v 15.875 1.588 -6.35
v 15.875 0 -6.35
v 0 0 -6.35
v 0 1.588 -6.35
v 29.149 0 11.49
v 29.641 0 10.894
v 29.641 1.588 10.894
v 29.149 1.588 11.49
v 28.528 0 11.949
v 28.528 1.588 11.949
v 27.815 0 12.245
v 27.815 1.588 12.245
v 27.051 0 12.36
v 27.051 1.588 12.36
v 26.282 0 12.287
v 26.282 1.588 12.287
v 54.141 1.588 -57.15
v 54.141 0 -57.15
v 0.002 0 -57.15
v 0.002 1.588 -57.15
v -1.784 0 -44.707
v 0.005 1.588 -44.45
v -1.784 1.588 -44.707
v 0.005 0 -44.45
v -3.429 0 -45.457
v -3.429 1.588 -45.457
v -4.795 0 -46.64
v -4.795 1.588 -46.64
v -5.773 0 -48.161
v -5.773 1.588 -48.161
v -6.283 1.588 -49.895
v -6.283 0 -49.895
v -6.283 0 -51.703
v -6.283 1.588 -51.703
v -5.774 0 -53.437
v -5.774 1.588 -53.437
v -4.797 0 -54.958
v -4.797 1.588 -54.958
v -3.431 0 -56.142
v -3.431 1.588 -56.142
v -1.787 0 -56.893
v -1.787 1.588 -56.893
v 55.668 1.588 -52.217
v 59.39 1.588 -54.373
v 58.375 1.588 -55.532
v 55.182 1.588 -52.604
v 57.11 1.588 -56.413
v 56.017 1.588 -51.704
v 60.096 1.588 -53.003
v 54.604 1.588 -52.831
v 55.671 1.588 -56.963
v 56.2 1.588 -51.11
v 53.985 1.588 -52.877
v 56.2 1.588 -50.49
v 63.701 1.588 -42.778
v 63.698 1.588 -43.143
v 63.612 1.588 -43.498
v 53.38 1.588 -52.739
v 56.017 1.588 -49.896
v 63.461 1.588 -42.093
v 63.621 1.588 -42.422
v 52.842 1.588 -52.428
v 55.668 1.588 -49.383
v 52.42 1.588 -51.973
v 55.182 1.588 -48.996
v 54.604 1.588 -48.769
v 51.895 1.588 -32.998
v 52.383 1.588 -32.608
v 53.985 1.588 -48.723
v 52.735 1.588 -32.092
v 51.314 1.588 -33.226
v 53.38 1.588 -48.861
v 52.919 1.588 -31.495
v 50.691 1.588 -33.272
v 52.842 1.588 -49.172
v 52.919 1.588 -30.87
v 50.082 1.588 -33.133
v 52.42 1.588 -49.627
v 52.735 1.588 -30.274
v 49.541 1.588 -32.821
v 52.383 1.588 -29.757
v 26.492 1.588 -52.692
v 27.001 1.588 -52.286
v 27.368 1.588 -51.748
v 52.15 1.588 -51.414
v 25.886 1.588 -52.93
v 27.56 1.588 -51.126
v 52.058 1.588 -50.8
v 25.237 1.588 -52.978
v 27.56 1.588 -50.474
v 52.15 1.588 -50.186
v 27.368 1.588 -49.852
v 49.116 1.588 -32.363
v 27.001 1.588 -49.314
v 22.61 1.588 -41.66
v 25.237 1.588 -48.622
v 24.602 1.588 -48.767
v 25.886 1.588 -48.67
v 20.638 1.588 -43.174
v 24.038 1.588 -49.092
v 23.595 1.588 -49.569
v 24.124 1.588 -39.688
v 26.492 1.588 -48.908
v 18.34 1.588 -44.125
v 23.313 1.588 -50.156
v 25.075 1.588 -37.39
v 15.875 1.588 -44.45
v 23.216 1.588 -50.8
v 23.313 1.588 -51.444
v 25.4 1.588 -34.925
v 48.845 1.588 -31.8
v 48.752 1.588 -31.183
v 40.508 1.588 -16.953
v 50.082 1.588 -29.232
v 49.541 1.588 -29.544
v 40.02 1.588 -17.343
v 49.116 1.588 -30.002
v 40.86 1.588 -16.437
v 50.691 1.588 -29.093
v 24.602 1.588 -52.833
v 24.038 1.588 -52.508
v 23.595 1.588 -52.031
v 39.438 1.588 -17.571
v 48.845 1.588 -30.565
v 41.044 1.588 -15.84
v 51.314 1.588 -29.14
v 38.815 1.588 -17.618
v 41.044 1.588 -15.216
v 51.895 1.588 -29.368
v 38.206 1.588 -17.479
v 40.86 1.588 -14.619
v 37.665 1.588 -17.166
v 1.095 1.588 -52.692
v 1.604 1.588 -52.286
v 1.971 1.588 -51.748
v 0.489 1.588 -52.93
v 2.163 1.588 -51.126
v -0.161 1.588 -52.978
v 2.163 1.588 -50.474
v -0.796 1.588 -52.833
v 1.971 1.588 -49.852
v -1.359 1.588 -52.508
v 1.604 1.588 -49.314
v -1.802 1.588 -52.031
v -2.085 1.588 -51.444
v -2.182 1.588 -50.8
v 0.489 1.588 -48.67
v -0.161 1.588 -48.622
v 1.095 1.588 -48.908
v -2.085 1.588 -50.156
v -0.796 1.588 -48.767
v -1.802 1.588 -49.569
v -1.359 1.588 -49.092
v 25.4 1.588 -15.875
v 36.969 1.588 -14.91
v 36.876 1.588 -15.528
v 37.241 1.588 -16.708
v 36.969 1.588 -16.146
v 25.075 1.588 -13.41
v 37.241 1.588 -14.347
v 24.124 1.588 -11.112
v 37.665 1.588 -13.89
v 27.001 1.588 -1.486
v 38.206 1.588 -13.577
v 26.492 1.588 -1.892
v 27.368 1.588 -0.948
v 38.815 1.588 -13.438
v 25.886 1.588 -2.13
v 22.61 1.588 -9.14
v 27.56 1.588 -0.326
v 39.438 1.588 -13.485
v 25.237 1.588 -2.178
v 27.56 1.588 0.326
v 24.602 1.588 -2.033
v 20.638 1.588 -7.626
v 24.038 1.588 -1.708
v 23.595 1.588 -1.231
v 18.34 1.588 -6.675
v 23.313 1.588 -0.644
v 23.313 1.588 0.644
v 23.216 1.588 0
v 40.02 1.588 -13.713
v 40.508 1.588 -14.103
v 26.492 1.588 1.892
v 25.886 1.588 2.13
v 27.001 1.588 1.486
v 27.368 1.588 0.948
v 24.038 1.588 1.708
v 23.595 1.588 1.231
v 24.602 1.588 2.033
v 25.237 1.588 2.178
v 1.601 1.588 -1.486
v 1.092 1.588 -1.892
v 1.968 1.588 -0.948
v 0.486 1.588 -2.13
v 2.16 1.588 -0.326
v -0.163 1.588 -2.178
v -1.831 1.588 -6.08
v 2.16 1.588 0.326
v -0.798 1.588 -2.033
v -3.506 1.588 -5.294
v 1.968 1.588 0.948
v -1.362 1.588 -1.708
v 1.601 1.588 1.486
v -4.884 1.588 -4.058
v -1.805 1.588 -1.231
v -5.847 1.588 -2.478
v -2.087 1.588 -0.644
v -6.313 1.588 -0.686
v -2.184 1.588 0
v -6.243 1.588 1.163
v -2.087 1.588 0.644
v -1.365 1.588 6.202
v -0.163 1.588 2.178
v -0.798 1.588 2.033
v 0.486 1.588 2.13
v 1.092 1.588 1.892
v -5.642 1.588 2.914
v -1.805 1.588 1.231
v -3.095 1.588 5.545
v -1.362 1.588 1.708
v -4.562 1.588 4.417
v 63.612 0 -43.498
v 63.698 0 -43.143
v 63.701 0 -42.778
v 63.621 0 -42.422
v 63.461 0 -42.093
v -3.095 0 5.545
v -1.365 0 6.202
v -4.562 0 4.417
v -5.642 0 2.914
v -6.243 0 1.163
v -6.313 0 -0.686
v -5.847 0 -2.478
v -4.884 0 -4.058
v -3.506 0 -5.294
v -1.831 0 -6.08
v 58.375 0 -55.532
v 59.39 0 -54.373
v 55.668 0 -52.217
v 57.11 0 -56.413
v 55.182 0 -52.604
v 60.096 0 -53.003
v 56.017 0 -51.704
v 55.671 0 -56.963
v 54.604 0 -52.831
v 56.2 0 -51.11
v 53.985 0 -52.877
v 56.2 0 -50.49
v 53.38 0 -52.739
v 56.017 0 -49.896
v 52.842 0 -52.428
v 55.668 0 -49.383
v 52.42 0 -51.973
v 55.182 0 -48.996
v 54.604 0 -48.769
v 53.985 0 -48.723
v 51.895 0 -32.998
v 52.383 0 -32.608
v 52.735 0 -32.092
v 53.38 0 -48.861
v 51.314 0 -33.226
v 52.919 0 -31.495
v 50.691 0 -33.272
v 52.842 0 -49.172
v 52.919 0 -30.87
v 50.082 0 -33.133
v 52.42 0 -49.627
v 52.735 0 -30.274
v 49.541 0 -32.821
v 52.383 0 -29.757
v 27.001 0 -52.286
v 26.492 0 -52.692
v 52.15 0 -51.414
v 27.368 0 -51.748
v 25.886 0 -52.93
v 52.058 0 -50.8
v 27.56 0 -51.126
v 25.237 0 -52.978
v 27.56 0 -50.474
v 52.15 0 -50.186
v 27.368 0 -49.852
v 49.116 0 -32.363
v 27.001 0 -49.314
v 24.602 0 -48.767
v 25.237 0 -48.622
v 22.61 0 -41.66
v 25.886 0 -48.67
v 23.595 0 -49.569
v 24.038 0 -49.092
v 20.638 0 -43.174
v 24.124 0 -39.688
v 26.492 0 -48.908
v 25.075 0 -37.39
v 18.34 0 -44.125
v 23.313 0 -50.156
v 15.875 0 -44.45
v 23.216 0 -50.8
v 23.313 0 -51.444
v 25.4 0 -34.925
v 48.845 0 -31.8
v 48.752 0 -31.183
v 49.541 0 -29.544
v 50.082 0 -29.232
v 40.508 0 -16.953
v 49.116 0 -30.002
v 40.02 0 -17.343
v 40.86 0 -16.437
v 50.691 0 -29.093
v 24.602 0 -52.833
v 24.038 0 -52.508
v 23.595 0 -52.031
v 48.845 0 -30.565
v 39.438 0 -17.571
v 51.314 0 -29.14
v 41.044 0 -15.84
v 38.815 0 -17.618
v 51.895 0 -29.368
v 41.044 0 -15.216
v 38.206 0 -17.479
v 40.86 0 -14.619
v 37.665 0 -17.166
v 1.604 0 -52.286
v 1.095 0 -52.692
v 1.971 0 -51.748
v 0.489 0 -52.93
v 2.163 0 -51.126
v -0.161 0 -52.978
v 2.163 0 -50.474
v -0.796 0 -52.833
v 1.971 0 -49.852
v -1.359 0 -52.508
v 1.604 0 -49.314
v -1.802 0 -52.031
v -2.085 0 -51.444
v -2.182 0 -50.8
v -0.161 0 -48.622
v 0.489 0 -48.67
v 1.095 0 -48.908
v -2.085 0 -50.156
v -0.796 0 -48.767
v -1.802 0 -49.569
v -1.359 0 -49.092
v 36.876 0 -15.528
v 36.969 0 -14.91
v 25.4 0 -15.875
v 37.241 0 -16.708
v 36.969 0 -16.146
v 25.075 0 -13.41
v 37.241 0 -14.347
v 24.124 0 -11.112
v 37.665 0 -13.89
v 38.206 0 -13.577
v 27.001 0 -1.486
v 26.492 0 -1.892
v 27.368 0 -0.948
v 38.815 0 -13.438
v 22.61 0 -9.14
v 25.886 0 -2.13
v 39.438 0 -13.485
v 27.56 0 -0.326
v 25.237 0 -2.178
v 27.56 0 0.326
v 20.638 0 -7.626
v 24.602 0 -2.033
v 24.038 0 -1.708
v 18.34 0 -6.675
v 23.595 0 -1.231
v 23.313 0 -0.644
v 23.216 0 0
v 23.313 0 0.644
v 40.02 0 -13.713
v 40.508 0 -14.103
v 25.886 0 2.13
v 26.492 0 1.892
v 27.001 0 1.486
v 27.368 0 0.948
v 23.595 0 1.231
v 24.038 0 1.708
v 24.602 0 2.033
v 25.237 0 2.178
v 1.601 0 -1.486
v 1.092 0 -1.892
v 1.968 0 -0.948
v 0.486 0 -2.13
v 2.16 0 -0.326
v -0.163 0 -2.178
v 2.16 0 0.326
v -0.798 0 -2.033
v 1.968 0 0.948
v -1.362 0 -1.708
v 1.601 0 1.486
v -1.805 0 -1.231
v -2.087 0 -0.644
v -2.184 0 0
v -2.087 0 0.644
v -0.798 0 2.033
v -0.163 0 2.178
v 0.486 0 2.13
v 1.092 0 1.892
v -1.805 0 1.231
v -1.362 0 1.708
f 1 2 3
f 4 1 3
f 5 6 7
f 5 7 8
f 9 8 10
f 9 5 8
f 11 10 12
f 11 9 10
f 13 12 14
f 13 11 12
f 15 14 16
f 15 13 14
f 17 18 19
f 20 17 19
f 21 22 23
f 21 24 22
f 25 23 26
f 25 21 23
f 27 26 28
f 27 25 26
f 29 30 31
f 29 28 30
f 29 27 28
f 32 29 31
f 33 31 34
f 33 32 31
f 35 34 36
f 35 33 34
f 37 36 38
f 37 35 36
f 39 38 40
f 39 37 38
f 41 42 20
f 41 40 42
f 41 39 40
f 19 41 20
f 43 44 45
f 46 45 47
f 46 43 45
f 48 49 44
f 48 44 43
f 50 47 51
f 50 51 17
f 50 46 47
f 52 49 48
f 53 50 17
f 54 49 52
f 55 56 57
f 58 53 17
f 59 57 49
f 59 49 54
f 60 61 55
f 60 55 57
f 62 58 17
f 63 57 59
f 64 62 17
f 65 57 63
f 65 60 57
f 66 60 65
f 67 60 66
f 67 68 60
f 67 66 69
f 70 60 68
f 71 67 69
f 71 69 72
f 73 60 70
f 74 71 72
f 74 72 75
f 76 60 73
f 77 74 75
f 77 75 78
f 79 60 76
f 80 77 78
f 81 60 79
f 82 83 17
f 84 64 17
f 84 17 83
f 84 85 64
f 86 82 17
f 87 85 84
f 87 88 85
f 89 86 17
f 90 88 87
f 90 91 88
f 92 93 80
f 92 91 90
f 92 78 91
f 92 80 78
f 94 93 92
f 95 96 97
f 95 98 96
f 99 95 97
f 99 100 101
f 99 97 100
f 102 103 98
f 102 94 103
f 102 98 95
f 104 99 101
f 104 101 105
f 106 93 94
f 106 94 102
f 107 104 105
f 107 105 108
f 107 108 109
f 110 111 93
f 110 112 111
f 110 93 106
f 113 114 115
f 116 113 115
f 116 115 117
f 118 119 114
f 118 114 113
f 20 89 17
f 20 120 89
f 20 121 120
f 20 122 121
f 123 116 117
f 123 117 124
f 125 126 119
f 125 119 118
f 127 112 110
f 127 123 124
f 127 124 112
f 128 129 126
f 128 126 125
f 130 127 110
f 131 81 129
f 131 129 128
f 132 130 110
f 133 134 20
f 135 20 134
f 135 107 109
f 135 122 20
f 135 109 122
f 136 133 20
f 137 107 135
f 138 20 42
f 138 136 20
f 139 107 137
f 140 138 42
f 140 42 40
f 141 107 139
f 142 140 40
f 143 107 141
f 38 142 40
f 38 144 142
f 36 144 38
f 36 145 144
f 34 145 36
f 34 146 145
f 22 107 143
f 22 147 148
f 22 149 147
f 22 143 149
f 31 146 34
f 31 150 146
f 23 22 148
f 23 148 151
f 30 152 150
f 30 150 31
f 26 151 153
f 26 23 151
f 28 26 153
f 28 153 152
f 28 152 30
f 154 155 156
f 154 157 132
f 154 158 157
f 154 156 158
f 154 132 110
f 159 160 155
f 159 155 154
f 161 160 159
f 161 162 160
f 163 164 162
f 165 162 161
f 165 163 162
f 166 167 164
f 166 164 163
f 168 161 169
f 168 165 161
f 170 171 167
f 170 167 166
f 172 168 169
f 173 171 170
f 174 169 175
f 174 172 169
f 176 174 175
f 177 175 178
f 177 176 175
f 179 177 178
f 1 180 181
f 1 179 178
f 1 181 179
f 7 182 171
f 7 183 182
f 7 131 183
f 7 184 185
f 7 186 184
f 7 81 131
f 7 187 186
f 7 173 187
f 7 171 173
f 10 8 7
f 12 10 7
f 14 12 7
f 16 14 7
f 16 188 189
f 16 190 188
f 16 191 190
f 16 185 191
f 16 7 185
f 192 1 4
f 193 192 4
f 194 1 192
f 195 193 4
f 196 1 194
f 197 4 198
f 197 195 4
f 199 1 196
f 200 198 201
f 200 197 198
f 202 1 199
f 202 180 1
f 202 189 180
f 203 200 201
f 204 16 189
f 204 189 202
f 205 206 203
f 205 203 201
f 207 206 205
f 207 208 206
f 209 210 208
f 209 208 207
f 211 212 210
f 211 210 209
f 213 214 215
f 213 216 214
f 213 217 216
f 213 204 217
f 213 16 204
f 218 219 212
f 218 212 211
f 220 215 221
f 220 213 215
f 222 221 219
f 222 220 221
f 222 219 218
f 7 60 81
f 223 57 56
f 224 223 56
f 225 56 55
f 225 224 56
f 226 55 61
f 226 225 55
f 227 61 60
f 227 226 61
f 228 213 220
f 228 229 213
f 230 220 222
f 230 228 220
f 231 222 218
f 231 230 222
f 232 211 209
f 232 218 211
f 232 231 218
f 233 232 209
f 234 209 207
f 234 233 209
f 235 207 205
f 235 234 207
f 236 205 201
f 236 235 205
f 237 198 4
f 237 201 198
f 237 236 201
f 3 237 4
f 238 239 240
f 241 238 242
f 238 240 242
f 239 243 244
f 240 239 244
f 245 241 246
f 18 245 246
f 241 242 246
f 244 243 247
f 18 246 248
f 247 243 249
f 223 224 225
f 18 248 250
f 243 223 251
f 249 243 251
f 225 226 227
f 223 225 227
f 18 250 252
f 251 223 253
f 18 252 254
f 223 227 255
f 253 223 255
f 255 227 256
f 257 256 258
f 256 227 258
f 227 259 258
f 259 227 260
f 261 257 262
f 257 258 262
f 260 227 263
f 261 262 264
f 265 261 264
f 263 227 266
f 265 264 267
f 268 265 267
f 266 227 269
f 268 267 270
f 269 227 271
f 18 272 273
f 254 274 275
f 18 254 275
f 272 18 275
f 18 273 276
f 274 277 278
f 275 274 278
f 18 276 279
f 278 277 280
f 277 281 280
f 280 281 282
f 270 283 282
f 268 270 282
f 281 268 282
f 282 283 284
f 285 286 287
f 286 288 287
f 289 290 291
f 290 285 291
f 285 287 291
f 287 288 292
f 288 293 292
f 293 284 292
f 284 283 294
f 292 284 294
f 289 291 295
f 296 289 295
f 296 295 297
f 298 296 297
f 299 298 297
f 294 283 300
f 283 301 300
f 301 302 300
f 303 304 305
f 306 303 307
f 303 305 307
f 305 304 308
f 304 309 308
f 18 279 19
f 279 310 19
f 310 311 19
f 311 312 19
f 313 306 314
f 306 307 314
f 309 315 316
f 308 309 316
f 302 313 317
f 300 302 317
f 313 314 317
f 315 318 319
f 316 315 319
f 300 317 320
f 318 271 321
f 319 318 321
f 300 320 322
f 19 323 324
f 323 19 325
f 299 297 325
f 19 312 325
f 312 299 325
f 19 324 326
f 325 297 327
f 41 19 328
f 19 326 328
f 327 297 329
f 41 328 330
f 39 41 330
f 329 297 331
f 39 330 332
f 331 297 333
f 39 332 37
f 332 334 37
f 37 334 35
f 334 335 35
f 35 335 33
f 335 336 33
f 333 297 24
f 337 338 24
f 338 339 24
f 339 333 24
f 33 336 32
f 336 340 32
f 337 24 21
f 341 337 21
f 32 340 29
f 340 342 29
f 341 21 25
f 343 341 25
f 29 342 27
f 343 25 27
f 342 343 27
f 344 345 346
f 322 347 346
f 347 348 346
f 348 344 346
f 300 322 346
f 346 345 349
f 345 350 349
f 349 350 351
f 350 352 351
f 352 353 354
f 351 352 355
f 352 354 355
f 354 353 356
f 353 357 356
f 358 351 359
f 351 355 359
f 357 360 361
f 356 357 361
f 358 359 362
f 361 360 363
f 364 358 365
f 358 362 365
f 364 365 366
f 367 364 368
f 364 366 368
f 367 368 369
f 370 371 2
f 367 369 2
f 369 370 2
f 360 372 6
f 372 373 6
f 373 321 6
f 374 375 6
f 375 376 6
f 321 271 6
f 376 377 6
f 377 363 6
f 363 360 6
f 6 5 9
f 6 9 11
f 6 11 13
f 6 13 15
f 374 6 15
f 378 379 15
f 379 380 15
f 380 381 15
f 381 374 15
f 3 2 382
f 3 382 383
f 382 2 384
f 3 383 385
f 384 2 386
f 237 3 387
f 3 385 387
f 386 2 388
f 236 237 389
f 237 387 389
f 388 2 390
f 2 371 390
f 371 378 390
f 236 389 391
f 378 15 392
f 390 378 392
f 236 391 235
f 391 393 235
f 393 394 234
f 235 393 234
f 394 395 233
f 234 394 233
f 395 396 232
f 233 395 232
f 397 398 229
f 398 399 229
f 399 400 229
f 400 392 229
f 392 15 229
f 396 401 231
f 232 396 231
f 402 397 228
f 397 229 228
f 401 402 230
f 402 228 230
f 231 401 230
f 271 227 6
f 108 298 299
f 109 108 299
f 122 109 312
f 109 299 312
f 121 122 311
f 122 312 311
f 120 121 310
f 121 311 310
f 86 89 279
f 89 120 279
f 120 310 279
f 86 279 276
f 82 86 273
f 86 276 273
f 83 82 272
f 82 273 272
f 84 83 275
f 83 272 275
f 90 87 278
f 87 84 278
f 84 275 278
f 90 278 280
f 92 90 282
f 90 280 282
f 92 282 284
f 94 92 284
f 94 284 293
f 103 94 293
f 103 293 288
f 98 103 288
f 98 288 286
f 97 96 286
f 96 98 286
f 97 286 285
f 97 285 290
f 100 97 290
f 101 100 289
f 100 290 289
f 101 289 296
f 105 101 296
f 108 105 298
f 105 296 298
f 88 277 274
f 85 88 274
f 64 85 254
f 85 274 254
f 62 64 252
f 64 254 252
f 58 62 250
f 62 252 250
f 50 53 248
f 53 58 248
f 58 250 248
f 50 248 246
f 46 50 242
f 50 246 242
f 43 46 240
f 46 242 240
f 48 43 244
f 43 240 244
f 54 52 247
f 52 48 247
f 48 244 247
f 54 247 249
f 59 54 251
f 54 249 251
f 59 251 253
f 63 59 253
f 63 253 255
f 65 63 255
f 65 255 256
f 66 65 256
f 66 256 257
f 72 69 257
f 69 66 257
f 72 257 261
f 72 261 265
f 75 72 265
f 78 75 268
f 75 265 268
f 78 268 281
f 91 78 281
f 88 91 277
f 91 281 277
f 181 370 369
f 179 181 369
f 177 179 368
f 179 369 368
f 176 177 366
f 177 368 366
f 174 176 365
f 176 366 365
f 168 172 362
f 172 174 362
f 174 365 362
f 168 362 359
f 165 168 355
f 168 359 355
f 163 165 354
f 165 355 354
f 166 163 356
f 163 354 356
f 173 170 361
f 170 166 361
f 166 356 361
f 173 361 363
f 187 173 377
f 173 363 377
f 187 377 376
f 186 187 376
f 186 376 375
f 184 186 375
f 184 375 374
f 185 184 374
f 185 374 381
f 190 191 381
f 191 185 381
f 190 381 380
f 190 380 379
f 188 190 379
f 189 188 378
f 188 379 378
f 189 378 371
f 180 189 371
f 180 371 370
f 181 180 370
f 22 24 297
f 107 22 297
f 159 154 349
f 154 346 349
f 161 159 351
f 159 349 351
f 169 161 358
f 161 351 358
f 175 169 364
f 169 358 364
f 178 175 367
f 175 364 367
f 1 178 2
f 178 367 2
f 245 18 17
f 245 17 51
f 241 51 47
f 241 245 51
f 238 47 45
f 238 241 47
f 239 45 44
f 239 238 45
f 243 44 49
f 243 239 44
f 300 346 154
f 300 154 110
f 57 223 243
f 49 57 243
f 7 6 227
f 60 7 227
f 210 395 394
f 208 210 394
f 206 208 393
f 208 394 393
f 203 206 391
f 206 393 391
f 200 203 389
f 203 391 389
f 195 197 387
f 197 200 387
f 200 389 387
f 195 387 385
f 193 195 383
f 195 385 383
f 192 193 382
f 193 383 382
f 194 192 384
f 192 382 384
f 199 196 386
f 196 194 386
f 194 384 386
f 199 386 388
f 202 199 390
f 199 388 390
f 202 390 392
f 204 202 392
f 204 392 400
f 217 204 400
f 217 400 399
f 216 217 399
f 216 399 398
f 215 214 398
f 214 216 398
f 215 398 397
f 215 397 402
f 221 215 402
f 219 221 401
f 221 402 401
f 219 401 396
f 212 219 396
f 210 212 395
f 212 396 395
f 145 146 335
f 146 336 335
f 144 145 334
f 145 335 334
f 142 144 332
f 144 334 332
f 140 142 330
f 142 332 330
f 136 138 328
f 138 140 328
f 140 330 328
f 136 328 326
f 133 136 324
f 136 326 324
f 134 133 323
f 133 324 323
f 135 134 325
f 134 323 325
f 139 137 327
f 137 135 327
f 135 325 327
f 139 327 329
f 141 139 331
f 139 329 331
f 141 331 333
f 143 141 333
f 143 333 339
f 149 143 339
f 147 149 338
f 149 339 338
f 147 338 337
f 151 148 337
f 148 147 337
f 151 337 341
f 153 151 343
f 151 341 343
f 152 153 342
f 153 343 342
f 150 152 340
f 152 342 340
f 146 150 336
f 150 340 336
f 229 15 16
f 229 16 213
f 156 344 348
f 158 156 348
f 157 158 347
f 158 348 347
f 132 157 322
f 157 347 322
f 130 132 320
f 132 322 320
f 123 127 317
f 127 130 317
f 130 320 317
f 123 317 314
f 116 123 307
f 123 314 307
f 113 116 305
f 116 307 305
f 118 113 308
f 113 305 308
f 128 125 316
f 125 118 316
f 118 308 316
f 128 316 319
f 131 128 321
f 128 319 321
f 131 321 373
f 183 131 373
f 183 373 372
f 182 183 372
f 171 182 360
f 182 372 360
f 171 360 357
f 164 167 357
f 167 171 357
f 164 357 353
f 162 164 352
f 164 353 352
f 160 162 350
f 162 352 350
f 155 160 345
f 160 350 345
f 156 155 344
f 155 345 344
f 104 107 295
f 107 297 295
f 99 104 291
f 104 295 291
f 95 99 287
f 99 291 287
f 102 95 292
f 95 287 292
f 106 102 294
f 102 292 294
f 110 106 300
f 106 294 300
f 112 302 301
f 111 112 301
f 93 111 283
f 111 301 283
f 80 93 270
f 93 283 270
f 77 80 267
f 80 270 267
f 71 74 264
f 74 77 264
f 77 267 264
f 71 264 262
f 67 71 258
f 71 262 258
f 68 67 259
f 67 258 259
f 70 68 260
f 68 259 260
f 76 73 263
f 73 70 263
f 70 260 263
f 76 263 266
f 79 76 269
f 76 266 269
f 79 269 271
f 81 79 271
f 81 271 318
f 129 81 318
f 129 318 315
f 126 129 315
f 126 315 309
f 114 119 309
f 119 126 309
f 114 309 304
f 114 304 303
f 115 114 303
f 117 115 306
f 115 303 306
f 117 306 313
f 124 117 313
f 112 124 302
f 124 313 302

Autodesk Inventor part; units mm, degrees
ref_plane "YZ Plane" through (0, 0, 0) normal (1, 0, 0) x (0, 1, 0)
ref_plane "XZ Plane" through (0, 0, 0) normal (0, 1, 0) x (-1, 0, 0)
ref_plane "XY Plane" through (0, 0, 0) normal (0, 0, 1) x (1, 0, 0)
sketch "main" plane through (0, 0, 0) normal (0, 0, 1) x (1, 0, 0)
  circle A0 centre (-18.8876, -16.6215) radius 2.0828
  arc A1 (-24.8433, -18.8241) -> (-18.8876, -22.9715) centre (-18.8876, -16.6215) ccw
  line L0 (5.6124, 45.0726) -> (-28.2078, -7.9145)
  circle A2 centre (9.8531, -16.6215) radius 2.1844
  line L1 (-18.8876, -22.9715) -> (35.2506, -22.9715)
  line L2 (9.8531, 18.3035) -> (9.8531, -0.7465)
  arc A3 (9.8531, -0.7465) -> (19.3781, -10.2715) centre (19.3781, -0.7465) ccw
  circle A4 centre (9.8531, 34.1785) radius 2.1844
  line L3 (35.2481, -10.2715) -> (19.3781, -10.2715)
  arc A5 (35.2506, -22.9715) -> (35.2481, -10.2715) centre (35.2506, -16.6215) ccw
  circle A6 centre (35.2531, 34.1785) radius 2.1844
  arc A7 (35.2531, 27.8285) -> (36.6181, 40.3801) centre (35.2531, 34.1785) ccw
  circle A8 centre (35.2506, -16.6215) radius 2.1844
  line L4 (-28.3586, -9.3193) -> (-24.8433, -18.8241)
  line L5 (19.3781, 27.8285) -> (35.2531, 27.8285)
  arc A9 (19.3781, 27.8285) -> (9.8531, 18.3035) centre (19.3781, 18.3035) ccw
  arc A10 (-28.2078, -7.9145) -> (-28.3586, -9.3193) centre (-26.8697, -8.7686) ccw
  line L6 (8.9712, 46.4651) -> (36.6181, 40.3801)
  arc A11 (8.9712, 46.4651) -> (5.6124, 45.0726) centre (8.2887, 43.3643) ccw
  circle A12 centre (-3.7188, 18.6506) radius 2.0955
  circle A13 centre (-15.5942, 2.9958) radius 2.0955
  point P0 (9.379, 13.4106)
  point P1 (9.8531, 27.8285)
  dimension "d0" = 4.1656
  dimension "d1" = 12.7
  dimension "d6" = 9.525
  dimension "d9" = 1.5875
  dimension "d17" = 3.175
  dimension "d18" = 50.8
  dimension "d19" = 7.8528
  dimension "d21" = 6.35
  dimension "d22" = 36.7228
  dimension "d23" = 50.8
  dimension "d24" = 25.4
  dimension "d28" = 4.191
  dimension "d29" = 4.191
sketch "Sketch1" plane through (0, 0, 0) normal (0, 1, 0) x (-1, 0, 0)
  circle A0 centre (-54.1407, -50.8) radius 2.0828
  arc A1 (-60.0964, -53.0027) -> (-54.1407, -57.15) centre (-54.1407, -50.8) ccw
  line L0 (-29.6407, 10.894) -> (-63.461, -42.0931)
  circle A2 centre (-25.4, -50.8) radius 2.1844
  line L1 (-54.1407, -57.15) -> (-0.0025, -57.15)
  line L2 (-25.4, -15.875) -> (-25.4, -34.925)
  arc A3 (-25.4, -34.925) -> (-15.875, -44.45) centre (-15.875, -34.925) ccw
  circle A4 centre (-25.4, 0) radius 2.1844
  line L3 (-0.005, -44.45) -> (-15.875, -44.45)
  arc A5 (-0.0025, -57.15) -> (-0.005, -44.45) centre (-0.0025, -50.8) ccw
  circle A6 centre (0, 0) radius 2.1844
  arc A7 (0, -6.35) -> (1.3649, 6.2016) centre (0, 0) ccw
  circle A8 centre (-0.0025, -50.8) radius 2.1844
  line L4 (-63.6118, -43.4979) -> (-60.0964, -53.0027)
  line L5 (-15.875, -6.35) -> (0, -6.35)
  arc A9 (-15.875, -6.35) -> (-25.4, -15.875) centre (-15.875, -15.875) ccw
  arc A10 (-63.461, -42.0931) -> (-63.6118, -43.4979) centre (-62.1228, -42.9472) ccw
  line L6 (-26.2819, 12.2866) -> (1.3649, 6.2016)
  arc A11 (-26.2819, 12.2866) -> (-29.6407, 10.894) centre (-26.9644, 9.1858) ccw
  circle A12 centre (-38.9719, -15.5279) radius 2.0955
  circle A13 centre (-50.8473, -31.1828) radius 2.0955
extrude "Extrusion1" add sketch "Sketch1" along normal blind 1.5875
properties part number "Funnel Gusset V2" material "Acetal Resin, White"
